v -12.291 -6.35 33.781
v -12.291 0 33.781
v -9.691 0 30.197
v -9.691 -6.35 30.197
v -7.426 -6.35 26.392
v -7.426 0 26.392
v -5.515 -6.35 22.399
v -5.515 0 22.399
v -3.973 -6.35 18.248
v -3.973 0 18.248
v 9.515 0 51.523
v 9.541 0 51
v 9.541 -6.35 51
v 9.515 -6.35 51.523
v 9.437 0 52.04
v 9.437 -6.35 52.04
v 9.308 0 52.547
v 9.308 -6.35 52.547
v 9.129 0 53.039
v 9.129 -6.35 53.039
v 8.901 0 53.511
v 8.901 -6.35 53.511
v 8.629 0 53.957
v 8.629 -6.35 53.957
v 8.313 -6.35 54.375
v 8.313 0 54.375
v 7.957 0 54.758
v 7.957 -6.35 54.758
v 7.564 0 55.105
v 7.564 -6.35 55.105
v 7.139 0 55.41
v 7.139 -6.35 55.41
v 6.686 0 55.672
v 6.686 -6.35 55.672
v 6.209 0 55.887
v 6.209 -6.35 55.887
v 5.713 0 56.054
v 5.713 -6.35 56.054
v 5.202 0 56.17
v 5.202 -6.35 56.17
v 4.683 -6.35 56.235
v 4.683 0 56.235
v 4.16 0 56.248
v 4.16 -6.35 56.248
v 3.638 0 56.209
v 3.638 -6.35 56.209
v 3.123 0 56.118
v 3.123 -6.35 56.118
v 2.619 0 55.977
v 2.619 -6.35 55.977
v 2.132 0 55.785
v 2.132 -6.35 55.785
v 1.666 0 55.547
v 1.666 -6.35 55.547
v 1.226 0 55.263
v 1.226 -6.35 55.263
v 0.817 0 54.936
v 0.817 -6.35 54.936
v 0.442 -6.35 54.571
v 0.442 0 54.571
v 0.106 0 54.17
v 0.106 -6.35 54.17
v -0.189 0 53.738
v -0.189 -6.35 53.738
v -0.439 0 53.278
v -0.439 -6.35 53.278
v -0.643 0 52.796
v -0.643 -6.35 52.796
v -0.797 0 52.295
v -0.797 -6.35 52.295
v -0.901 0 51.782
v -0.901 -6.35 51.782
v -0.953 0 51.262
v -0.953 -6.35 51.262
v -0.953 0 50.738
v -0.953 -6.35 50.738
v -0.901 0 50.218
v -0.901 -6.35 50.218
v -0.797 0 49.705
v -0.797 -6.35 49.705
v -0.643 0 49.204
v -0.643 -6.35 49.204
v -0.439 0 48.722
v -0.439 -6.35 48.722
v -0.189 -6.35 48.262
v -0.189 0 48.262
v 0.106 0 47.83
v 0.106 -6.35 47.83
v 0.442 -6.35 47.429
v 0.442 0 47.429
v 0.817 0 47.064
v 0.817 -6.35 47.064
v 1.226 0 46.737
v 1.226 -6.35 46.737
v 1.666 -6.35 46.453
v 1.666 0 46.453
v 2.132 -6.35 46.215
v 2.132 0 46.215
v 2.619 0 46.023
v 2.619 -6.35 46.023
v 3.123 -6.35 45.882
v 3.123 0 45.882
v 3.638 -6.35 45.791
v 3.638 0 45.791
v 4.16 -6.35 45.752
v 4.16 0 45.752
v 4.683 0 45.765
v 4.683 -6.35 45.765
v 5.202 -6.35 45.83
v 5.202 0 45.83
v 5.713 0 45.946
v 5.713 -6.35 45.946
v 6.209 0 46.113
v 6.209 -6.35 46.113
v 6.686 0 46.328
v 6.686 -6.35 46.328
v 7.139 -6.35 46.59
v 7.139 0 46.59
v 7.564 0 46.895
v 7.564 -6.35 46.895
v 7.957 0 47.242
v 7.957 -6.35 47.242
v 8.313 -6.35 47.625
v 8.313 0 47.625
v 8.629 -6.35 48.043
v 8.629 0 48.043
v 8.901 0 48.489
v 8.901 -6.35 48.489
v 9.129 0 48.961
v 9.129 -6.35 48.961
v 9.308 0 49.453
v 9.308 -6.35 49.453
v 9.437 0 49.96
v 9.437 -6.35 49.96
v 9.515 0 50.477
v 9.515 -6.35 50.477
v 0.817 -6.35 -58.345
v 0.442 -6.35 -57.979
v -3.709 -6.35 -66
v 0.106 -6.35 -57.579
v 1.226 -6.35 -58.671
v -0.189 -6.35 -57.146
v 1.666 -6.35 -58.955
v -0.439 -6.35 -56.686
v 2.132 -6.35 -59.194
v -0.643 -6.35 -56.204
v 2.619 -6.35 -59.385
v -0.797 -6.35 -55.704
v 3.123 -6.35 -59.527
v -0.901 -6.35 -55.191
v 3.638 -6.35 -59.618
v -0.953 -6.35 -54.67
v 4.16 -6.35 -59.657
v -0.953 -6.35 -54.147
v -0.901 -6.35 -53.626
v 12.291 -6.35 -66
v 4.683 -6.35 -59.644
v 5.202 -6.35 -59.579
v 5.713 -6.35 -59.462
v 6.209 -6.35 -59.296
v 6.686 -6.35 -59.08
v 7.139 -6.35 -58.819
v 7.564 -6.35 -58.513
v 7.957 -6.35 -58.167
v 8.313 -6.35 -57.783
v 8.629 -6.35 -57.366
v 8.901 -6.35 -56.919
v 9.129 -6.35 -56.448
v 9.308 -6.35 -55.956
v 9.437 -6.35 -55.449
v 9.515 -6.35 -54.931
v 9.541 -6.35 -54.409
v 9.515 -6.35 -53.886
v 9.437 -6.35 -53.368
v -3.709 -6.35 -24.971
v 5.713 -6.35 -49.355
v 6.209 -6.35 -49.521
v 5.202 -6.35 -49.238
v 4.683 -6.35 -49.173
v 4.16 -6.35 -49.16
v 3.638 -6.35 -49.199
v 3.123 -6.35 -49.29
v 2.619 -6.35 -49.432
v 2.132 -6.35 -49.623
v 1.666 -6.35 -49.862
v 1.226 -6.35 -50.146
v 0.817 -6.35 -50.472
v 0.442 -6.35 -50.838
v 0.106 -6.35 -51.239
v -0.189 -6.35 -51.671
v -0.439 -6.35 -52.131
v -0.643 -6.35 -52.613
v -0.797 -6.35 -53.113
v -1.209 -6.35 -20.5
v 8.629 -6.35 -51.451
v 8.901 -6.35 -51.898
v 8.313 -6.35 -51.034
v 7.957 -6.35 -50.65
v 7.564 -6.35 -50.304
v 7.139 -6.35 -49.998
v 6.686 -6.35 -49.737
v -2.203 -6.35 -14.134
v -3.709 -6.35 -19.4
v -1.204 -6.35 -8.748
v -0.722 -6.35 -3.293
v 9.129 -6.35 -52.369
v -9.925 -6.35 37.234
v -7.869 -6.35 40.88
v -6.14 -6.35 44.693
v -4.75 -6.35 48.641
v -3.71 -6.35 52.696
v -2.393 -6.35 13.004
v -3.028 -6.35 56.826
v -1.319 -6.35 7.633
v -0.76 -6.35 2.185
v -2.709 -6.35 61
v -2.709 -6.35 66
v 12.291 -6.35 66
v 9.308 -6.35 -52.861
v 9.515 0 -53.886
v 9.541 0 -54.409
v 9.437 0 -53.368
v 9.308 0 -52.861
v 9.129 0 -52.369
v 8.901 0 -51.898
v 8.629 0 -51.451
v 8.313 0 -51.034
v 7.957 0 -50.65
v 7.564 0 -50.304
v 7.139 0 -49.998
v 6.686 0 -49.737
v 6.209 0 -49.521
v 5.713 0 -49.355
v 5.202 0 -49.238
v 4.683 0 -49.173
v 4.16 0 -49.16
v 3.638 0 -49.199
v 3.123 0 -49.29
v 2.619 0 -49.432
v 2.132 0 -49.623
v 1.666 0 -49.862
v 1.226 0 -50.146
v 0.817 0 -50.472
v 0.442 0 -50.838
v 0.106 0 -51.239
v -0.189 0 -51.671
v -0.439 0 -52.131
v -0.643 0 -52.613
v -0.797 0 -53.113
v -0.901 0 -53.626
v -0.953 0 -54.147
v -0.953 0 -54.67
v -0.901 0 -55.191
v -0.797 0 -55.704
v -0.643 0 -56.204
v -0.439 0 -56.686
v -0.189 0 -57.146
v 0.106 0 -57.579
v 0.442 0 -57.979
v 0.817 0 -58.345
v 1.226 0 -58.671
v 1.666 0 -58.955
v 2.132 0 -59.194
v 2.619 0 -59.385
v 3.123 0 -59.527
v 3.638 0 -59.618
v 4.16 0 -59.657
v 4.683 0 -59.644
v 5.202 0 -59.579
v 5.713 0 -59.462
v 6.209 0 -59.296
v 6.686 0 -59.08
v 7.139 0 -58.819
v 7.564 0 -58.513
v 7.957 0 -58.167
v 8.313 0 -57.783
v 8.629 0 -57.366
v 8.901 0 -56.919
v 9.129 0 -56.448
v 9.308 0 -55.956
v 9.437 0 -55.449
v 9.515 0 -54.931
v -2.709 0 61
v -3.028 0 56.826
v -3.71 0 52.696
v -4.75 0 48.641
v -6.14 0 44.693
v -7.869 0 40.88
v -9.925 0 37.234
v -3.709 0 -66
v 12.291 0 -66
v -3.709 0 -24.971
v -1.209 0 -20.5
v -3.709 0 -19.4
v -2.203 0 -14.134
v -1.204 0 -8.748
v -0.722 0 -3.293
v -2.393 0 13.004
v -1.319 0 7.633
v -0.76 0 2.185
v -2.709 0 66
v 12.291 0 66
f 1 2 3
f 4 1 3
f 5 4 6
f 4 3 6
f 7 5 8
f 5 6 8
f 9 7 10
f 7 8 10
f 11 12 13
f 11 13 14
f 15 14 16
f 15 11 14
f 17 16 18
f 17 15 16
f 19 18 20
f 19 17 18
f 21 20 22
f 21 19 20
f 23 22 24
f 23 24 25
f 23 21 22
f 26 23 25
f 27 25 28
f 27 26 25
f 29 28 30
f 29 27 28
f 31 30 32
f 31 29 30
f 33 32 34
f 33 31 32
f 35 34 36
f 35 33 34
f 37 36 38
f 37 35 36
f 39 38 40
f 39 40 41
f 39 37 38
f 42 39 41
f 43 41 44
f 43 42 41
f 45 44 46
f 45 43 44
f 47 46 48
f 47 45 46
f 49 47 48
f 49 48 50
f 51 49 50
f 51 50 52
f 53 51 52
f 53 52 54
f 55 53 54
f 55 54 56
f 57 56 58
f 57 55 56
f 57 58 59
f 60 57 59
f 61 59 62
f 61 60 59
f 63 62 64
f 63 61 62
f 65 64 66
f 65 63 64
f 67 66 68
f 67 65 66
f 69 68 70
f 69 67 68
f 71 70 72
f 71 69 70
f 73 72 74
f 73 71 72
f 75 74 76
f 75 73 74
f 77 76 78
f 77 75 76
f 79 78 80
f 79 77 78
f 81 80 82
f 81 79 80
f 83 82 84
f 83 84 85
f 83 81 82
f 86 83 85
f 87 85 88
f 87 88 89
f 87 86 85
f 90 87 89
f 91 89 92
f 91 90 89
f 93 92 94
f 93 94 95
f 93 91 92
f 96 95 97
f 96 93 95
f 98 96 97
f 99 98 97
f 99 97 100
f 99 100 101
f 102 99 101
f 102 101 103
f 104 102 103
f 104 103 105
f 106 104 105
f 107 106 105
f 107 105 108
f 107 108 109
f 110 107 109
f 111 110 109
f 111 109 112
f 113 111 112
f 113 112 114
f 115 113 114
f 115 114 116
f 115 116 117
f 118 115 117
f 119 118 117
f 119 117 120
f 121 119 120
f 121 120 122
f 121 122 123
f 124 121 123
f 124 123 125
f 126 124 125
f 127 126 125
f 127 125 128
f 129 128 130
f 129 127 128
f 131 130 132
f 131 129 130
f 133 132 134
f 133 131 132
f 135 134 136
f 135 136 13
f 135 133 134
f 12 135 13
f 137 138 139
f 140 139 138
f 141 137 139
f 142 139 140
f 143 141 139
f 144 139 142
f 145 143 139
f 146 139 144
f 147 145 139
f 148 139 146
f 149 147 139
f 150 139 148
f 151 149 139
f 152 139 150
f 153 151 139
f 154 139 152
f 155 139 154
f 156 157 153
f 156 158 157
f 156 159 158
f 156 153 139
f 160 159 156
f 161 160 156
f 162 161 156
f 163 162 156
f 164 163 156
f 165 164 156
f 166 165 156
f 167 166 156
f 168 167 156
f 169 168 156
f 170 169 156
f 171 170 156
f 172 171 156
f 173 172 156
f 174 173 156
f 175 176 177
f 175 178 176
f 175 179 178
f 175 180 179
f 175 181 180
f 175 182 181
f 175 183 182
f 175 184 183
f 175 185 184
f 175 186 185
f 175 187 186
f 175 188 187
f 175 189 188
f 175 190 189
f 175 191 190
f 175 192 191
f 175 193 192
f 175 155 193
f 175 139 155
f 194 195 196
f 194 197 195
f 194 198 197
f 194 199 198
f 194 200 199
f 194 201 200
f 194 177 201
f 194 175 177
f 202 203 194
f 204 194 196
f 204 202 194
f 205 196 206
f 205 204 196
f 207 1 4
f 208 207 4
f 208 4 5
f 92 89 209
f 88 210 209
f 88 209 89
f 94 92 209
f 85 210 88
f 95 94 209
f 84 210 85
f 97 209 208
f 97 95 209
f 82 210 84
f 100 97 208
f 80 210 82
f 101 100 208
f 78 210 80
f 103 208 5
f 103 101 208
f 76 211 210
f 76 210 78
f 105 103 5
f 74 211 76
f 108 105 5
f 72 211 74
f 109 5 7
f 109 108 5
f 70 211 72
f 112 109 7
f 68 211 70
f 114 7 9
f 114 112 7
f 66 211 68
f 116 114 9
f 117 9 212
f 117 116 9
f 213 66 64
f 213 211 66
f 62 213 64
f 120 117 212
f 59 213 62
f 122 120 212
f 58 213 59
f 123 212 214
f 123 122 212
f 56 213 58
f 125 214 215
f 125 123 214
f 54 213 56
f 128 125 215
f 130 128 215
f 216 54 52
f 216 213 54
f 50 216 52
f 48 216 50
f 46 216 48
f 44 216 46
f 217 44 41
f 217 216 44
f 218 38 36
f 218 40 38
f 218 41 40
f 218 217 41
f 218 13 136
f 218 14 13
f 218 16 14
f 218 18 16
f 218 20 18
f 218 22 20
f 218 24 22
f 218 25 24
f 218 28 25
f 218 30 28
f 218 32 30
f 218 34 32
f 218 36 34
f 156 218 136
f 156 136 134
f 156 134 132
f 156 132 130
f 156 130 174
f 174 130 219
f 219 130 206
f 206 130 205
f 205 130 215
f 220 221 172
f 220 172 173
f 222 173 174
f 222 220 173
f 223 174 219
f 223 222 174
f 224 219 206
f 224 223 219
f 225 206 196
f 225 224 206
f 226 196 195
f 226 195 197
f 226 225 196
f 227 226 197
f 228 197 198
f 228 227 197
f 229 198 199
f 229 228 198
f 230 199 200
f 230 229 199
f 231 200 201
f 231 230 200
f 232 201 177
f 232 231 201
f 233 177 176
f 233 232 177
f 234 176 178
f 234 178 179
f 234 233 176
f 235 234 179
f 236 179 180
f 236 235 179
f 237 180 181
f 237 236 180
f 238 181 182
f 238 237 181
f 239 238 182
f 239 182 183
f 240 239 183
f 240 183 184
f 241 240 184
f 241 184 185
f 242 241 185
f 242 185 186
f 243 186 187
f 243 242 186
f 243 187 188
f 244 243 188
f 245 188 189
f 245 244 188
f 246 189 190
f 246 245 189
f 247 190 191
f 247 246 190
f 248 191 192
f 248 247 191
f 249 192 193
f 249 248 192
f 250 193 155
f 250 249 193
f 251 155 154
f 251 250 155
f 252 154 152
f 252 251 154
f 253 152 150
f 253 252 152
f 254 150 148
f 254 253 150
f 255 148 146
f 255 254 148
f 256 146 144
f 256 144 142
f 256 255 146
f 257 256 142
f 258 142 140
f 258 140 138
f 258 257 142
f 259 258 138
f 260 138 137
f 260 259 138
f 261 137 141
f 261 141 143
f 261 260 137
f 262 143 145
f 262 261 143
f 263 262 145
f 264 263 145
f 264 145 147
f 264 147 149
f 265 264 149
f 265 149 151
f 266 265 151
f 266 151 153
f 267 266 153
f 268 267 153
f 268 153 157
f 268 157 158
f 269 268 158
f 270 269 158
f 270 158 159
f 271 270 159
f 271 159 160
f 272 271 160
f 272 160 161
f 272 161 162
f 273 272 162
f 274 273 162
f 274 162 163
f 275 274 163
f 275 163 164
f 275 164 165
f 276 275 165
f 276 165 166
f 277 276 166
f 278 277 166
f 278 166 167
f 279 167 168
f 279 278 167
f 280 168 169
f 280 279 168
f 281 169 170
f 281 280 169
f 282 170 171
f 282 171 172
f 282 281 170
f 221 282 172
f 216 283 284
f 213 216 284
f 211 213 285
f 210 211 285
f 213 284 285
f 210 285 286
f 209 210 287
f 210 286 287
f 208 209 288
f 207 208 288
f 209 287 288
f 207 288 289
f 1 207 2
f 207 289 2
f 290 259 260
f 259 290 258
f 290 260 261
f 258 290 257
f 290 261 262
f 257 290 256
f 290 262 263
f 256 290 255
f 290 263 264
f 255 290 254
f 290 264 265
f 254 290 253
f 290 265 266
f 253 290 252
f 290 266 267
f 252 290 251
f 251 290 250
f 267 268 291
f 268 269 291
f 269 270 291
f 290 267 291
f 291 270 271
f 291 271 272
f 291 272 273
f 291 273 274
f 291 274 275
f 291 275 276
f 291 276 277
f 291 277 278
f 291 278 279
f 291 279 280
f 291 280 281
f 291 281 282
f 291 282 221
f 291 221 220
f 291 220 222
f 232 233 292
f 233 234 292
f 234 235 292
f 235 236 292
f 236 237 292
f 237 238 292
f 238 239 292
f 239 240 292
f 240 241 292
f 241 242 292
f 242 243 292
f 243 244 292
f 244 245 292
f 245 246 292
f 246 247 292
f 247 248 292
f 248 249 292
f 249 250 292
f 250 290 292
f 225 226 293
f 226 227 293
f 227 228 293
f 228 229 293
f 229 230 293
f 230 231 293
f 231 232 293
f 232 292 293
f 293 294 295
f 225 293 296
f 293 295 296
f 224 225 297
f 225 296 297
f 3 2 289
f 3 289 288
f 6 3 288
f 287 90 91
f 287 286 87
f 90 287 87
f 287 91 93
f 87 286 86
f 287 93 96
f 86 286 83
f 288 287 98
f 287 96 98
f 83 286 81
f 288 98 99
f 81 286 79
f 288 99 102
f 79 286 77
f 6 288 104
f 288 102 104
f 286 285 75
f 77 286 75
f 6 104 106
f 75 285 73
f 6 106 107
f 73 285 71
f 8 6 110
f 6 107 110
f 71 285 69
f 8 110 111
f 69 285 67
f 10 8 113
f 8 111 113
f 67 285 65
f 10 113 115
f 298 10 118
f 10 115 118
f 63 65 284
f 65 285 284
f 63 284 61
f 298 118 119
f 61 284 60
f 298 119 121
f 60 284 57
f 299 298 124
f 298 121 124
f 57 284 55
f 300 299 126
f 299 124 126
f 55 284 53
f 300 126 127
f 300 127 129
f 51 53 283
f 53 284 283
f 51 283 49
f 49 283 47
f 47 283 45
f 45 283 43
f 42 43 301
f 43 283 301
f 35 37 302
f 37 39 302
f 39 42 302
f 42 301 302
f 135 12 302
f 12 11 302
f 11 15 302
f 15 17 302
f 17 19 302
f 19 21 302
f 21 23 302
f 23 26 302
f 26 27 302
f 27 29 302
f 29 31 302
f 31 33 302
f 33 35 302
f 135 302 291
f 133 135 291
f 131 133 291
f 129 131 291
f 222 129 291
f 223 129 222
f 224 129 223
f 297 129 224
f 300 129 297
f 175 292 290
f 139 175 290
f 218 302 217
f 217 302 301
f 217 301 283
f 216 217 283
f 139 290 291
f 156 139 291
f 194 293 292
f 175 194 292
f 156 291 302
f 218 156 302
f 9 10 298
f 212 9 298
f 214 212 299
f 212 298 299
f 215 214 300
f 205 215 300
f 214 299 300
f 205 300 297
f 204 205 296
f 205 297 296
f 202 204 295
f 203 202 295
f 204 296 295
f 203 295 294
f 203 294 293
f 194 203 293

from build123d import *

# Parameters (mm, degrees)
F0_R     = 5.2500022
F1_DEPTH = 6.35


# Not quite as in the source:
# - ends of sketch curves that miss each other by under 0.0002 mm in the source are joined


with BuildPart() as f1:
    # F0 (on Front) → F1 (new body)
    with BuildSketch(Plane.XZ):
        with BuildLine():
            Line((-2.7092148, 65.999995), (-2.7092148, 60.9999796))
            ThreePointArc((-2.7092148, 60.9999796), (-5.4016290161, 46.6516213468), (-12.2907672961, 33.7805612895))
            ThreePointArc((-12.2907672961, 33.7805612895), (-7.426360466, 26.392264731), (-3.9728687393, 18.248400136))
            ThreePointArc((-3.9728687393, 18.248400136), (-0.6755780926, -0.5535614771), (-3.7092166309, -19.3998583041))
            Line((-3.7092166309, -19.3998583041), (-1.2092178, -20.5000098))
            Line((-1.2092178, -20.5000098), (-3.7092128, -24.9706384))
            Line((-3.7092128, -24.9706384), (-3.7092128, -65.999995))
            Line((-3.7092128, -65.999995), (12.2907806, -65.999995))
            Line((12.2907806, -65.999995), (12.2907806, 65.999995))
            Line((12.2907806, 65.999995), (-2.7092148, 65.999995))
        make_face()
        with Locations((4.2907712, -54.4085272)):
            Circle(F0_R, mode=Mode.SUBTRACT)
        with Locations((4.2907712, 50.9999996)):
            Circle(F0_R, mode=Mode.SUBTRACT)
    extrude(amount=F1_DEPTH)


solid = f1.part
